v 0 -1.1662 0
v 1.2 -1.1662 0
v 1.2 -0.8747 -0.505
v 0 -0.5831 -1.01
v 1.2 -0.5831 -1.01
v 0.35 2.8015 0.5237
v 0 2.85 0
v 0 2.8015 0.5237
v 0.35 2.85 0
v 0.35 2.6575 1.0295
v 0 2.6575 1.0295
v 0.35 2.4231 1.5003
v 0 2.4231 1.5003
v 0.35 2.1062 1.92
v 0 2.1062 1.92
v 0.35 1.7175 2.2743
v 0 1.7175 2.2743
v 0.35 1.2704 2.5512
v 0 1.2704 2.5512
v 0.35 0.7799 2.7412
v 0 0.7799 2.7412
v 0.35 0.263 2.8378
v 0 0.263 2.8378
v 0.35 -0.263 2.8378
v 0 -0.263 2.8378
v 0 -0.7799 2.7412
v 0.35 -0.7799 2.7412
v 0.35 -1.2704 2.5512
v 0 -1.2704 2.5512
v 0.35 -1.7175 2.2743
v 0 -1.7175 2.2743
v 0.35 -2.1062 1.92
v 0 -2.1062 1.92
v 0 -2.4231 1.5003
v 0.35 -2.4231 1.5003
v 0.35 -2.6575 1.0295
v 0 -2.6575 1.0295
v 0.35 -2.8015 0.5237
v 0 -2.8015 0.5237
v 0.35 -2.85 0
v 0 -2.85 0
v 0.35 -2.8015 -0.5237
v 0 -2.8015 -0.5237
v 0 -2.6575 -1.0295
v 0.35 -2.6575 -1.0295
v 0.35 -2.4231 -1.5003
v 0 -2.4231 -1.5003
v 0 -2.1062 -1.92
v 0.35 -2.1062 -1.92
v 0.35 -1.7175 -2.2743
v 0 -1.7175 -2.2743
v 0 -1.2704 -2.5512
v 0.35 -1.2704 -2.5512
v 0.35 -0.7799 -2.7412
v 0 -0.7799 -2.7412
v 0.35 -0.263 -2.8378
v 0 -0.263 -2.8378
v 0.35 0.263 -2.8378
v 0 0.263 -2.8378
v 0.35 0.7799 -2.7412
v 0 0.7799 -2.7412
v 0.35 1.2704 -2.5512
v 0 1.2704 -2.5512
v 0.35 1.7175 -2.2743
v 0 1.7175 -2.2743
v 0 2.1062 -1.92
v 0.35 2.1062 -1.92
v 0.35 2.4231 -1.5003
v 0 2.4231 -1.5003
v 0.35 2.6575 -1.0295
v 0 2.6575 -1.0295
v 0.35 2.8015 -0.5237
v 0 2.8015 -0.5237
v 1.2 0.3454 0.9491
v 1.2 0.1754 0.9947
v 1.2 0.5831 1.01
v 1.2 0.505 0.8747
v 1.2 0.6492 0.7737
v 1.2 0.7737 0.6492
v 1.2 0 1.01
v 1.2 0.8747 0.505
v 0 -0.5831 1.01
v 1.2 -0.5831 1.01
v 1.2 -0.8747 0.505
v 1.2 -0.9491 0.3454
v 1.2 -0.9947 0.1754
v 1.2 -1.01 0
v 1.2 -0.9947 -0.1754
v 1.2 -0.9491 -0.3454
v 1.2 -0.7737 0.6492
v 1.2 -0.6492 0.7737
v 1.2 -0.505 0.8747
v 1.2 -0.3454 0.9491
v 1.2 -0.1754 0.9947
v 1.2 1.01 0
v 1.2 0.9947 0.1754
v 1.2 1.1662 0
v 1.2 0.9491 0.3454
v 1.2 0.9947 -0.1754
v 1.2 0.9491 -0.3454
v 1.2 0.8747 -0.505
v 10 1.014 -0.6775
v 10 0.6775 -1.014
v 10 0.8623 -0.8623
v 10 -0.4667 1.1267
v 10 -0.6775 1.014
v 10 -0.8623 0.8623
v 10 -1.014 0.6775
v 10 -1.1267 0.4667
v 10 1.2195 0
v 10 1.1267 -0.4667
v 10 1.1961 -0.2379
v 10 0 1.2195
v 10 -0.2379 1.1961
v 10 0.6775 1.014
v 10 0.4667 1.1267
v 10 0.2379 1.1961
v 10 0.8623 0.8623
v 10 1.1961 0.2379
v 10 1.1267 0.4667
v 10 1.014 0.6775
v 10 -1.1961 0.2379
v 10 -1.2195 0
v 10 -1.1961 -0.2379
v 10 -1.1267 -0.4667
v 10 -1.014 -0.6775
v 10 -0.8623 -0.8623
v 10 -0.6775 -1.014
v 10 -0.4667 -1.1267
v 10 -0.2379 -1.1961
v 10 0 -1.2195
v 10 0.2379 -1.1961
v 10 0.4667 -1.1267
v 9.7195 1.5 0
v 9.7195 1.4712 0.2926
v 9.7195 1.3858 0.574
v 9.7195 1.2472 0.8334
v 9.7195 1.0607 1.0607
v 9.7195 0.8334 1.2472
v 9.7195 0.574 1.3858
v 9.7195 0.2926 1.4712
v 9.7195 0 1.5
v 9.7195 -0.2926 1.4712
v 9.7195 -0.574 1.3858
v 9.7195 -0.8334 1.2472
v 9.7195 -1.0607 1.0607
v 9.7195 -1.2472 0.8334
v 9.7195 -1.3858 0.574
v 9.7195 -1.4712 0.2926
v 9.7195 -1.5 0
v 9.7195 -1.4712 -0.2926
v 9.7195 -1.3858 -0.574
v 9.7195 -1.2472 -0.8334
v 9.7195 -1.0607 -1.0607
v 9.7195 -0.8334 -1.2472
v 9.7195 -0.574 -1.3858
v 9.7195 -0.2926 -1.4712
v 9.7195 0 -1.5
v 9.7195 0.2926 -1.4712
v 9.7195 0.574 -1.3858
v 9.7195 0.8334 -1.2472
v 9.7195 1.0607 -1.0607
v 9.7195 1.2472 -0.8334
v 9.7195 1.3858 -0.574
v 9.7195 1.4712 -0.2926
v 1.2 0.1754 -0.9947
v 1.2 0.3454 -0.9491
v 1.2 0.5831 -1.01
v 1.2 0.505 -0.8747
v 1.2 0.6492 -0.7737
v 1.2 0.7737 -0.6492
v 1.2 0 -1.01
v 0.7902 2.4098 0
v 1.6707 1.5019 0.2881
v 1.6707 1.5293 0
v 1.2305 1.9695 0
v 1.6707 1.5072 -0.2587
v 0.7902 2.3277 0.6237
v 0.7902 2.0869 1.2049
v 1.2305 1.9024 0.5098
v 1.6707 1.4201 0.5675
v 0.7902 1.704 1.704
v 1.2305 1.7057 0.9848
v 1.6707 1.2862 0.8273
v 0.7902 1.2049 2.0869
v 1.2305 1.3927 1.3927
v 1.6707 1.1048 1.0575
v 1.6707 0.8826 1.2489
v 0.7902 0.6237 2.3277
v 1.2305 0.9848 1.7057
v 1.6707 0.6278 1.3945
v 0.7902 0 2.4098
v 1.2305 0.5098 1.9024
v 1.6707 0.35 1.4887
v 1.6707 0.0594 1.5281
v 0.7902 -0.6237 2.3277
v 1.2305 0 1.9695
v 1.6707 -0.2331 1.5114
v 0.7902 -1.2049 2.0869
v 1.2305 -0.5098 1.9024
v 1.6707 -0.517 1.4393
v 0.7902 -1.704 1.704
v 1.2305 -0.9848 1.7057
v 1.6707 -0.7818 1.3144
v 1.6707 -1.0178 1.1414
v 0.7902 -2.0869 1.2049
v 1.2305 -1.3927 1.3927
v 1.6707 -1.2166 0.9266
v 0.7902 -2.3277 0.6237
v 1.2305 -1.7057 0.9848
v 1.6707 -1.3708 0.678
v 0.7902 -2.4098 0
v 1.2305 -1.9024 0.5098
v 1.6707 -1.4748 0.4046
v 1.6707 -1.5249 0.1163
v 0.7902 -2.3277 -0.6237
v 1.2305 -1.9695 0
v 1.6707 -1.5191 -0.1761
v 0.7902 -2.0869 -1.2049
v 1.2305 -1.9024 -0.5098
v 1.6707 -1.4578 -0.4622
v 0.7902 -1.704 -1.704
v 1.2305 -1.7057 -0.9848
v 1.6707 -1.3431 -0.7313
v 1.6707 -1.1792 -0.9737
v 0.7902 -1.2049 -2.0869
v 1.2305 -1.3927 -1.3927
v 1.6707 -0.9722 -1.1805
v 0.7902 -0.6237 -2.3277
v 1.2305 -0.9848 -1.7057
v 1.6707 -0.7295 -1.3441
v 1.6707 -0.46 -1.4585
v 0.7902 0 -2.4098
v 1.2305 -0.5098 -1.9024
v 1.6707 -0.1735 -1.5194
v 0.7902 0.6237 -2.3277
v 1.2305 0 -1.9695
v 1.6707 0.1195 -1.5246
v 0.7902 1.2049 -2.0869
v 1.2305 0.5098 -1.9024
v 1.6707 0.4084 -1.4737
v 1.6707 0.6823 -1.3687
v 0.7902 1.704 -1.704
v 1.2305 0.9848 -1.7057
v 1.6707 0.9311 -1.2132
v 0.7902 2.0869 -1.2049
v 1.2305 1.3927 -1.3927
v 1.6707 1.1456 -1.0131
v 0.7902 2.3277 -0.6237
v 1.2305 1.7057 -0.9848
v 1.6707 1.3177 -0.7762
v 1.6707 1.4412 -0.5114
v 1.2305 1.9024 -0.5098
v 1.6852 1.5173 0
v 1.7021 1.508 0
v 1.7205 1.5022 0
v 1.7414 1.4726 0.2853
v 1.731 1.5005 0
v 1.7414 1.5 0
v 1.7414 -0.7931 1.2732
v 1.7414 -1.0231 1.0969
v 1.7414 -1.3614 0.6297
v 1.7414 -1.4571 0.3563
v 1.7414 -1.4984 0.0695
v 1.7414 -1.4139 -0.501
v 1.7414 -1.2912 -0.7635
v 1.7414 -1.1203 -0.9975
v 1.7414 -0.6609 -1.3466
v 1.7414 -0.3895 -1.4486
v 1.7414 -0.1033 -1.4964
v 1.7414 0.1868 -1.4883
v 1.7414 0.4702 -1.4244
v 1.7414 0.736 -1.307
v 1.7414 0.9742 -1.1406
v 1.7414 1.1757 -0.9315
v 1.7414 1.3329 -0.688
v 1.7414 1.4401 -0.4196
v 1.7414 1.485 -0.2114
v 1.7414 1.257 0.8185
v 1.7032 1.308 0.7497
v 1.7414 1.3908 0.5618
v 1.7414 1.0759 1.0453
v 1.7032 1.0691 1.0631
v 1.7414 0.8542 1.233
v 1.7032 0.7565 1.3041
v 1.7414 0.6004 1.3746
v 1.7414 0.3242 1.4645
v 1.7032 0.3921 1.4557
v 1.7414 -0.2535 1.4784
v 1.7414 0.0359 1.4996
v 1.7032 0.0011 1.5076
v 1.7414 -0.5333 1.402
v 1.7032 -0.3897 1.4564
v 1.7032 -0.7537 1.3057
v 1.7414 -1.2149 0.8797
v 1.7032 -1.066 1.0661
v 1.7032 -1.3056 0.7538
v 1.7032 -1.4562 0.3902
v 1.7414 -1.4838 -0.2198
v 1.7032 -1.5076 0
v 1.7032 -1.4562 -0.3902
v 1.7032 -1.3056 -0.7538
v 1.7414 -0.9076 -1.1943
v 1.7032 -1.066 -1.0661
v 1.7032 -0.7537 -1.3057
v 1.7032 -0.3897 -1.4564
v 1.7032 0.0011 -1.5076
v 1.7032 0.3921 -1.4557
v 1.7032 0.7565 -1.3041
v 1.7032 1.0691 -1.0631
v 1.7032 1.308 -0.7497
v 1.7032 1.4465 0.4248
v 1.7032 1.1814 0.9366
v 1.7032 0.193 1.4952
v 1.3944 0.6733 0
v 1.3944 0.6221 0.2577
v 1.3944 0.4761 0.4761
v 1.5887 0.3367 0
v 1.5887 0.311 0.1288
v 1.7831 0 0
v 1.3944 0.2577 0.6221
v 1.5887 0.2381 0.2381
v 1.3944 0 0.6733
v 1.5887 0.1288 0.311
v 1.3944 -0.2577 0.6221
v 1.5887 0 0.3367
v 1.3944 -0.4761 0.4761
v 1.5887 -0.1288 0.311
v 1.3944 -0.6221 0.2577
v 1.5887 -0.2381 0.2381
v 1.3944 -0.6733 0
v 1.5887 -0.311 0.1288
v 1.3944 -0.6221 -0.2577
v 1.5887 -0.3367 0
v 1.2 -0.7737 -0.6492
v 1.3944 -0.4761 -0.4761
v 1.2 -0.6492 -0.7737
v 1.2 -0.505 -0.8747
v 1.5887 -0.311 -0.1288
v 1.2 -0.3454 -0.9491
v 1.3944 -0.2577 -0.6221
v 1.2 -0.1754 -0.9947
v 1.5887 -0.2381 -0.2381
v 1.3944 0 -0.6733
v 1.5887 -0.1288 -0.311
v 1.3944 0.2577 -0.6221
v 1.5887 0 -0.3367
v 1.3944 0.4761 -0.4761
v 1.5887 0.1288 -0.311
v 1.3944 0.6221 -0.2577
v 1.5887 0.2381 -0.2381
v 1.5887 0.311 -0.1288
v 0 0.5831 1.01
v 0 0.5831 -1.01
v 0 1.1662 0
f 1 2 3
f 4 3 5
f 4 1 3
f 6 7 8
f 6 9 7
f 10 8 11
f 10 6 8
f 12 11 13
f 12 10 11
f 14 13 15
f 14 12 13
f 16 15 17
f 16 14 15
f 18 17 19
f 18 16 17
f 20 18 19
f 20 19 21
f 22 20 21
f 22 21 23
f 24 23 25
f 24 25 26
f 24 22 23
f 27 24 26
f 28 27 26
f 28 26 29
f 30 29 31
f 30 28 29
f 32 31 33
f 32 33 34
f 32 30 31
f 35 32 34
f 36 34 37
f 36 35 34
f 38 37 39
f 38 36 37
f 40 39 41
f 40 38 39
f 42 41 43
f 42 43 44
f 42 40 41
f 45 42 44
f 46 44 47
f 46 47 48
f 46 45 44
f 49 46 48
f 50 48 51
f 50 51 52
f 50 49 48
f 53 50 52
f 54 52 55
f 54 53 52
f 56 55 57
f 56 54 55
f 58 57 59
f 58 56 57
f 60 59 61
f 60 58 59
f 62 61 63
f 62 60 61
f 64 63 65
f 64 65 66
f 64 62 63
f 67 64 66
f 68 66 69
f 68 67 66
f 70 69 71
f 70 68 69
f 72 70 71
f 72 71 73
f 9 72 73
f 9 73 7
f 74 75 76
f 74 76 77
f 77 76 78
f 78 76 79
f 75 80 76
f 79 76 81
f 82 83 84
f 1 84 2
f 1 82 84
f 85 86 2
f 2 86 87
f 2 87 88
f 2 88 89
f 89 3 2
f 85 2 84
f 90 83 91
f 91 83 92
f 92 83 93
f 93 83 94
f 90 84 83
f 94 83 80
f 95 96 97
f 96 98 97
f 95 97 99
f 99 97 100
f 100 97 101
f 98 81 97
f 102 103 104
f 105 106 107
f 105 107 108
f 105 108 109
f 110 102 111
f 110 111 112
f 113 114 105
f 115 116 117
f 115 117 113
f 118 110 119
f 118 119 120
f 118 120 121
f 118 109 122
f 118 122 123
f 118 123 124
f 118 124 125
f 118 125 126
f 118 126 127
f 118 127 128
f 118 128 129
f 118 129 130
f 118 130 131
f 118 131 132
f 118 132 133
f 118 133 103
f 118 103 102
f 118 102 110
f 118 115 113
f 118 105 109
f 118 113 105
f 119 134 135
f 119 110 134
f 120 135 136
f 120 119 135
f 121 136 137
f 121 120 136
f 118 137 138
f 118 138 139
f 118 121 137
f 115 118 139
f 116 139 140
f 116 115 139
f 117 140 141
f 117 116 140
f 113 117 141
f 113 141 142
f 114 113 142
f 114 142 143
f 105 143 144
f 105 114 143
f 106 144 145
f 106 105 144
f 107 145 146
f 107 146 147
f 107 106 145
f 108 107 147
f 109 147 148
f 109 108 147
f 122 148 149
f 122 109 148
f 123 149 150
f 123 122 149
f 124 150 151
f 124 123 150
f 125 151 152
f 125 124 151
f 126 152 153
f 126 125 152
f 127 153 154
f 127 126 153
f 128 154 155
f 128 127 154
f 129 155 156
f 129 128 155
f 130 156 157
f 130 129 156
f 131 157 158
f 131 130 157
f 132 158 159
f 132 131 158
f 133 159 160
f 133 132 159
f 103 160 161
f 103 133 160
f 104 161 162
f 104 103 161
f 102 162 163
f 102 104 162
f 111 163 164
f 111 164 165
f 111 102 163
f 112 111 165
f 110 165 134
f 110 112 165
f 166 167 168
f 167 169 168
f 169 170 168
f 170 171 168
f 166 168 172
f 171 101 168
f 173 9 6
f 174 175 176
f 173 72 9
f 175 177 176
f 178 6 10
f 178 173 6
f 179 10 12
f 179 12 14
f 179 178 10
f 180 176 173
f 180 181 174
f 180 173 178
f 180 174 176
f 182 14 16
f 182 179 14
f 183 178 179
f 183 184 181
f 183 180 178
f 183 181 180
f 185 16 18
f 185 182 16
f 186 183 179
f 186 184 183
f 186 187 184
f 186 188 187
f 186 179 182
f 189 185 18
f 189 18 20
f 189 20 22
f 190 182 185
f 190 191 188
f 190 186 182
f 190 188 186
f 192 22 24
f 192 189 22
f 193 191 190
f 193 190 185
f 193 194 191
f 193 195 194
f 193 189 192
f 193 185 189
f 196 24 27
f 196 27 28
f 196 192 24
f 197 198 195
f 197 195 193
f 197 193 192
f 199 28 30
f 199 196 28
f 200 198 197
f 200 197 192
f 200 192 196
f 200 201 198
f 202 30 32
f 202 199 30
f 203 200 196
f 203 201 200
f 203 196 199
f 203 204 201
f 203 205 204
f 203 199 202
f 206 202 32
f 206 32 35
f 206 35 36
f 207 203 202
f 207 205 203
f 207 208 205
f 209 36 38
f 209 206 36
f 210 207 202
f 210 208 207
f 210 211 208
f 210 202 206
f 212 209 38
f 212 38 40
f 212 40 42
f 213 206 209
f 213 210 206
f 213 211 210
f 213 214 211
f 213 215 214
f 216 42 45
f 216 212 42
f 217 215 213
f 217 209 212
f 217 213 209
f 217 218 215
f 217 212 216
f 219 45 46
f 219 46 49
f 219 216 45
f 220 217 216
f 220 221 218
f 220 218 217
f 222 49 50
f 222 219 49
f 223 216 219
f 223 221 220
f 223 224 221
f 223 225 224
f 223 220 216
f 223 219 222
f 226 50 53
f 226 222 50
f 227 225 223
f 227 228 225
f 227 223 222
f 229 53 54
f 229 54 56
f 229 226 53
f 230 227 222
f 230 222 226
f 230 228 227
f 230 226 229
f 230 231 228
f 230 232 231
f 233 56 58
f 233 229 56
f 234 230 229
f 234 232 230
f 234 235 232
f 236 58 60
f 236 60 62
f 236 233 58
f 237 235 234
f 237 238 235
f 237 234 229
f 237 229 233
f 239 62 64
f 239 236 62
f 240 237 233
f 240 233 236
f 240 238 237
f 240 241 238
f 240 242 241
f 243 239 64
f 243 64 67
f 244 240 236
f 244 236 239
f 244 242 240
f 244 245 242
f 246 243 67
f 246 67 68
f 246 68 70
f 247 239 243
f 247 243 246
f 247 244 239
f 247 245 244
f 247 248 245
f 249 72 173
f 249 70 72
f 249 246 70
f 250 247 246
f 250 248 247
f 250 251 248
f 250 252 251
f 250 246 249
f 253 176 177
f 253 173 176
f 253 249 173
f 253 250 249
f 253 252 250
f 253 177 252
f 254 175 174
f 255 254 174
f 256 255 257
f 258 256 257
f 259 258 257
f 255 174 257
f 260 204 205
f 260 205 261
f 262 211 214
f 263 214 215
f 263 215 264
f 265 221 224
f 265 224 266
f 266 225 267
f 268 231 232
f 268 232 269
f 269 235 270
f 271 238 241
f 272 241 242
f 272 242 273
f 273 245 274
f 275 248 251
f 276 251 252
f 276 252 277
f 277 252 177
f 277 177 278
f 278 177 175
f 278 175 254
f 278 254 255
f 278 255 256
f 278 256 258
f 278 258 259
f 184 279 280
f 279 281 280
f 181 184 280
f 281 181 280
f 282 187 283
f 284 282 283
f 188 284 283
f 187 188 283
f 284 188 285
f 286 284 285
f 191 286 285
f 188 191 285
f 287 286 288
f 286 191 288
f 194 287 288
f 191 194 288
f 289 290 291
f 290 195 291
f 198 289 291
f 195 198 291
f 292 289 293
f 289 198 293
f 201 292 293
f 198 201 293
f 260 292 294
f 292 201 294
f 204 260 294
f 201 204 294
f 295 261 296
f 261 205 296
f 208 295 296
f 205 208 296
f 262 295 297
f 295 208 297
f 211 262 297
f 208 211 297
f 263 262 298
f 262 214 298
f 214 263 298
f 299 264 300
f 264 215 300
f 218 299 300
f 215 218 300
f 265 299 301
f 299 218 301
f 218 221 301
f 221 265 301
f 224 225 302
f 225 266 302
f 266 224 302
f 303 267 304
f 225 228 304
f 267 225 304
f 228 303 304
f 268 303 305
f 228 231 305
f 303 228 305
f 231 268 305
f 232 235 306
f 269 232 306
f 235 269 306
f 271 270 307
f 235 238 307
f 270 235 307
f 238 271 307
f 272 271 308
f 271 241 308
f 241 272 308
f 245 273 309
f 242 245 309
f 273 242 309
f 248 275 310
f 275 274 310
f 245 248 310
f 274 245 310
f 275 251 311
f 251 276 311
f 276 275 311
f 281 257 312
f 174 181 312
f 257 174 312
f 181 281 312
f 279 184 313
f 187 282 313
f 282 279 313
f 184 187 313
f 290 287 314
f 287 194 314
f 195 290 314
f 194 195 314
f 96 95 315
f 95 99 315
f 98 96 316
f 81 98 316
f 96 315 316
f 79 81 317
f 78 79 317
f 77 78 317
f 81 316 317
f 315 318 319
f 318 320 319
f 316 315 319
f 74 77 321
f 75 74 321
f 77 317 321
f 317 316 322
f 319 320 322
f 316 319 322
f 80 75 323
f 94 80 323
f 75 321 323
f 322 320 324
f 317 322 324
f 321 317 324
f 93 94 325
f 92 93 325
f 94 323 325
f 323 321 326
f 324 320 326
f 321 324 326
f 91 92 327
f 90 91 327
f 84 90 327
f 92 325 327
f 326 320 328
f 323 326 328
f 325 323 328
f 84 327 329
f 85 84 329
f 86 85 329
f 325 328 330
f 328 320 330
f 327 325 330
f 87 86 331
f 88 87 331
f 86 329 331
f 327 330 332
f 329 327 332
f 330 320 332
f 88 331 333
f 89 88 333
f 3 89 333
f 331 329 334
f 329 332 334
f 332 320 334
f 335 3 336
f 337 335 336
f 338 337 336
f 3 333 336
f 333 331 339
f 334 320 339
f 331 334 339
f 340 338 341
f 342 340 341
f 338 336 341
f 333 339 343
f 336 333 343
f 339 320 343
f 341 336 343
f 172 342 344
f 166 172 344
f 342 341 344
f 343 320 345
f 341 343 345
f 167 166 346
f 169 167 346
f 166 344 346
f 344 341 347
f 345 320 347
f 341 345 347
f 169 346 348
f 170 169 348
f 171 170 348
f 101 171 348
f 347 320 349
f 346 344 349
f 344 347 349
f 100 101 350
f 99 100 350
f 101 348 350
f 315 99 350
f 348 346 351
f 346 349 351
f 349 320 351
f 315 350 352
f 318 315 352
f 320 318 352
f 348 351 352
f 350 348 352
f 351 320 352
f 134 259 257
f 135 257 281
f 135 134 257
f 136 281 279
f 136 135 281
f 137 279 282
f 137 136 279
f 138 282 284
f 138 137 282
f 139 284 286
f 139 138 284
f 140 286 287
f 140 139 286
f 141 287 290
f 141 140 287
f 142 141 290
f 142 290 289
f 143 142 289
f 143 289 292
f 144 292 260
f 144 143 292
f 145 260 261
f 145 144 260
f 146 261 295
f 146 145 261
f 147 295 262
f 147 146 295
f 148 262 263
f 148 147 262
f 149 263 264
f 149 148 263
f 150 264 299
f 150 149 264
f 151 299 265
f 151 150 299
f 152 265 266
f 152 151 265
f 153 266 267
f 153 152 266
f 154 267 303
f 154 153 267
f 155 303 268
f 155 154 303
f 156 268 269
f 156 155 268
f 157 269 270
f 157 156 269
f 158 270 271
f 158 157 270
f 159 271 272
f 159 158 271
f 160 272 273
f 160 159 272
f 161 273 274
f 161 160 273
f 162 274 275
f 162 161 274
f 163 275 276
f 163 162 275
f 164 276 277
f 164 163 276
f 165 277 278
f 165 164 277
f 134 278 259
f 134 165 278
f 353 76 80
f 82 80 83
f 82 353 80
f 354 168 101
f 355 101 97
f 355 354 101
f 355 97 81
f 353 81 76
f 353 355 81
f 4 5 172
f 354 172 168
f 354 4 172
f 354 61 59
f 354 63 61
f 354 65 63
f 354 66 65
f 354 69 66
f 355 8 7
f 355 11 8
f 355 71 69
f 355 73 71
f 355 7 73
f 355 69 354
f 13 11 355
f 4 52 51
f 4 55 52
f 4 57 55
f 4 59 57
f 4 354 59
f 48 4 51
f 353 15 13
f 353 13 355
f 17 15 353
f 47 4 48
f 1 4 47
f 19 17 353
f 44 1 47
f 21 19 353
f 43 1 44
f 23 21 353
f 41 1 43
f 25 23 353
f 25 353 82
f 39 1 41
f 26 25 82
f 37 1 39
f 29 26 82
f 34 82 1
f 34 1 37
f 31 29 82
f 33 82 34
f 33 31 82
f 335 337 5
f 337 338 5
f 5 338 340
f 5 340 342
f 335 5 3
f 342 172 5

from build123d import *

# Parameters (mm, degrees)
FILLET1_R   = 0.1
HEX_2_DEPTH = 1.2


with BuildPart() as part:
    # BodySke → BaseBody (revolve)
    with BuildSketch(Plane.XY):
        Polygon((0, 0), (0, 2.85), (0.35, 2.85), (1.7, 1.5), (9.7195, 1.5), (10, 1.2195), (10, 0), align=None)
    revolve(axis=Axis((0, 0, 0), (1, 0, 0)))

    # Fillet1
    fillet1_edges = [part.edges().sort_by_distance(p)[0] for p in [
        (1.7, -1.5, 0),
    ]]
    fillet(fillet1_edges, radius=FILLET1_R)

    # Sketch2 → PreBroach (revolve, cut)
    with BuildSketch(Plane.XY):
        Polygon((0, 1.01), (1.2, 1.01), (1.783123772, 0), (0, 0), align=None)
    revolve(axis=Axis((0, 0, 0), (1, 0, 0)), mode=Mode.SUBTRACT)

    # Sketch3 → Hex 2 (cut)
    with BuildSketch(Plane.ZY):
        Polygon((-1.01, -0.583123772), (-1.01, 0.583123772), (0, 1.166247544), (1.01, 0.583123772), (1.01, -0.583123772), (0, -1.166247544), align=None)
    extrude(amount=-HEX_2_DEPTH, mode=Mode.SUBTRACT)


solid = part.part
